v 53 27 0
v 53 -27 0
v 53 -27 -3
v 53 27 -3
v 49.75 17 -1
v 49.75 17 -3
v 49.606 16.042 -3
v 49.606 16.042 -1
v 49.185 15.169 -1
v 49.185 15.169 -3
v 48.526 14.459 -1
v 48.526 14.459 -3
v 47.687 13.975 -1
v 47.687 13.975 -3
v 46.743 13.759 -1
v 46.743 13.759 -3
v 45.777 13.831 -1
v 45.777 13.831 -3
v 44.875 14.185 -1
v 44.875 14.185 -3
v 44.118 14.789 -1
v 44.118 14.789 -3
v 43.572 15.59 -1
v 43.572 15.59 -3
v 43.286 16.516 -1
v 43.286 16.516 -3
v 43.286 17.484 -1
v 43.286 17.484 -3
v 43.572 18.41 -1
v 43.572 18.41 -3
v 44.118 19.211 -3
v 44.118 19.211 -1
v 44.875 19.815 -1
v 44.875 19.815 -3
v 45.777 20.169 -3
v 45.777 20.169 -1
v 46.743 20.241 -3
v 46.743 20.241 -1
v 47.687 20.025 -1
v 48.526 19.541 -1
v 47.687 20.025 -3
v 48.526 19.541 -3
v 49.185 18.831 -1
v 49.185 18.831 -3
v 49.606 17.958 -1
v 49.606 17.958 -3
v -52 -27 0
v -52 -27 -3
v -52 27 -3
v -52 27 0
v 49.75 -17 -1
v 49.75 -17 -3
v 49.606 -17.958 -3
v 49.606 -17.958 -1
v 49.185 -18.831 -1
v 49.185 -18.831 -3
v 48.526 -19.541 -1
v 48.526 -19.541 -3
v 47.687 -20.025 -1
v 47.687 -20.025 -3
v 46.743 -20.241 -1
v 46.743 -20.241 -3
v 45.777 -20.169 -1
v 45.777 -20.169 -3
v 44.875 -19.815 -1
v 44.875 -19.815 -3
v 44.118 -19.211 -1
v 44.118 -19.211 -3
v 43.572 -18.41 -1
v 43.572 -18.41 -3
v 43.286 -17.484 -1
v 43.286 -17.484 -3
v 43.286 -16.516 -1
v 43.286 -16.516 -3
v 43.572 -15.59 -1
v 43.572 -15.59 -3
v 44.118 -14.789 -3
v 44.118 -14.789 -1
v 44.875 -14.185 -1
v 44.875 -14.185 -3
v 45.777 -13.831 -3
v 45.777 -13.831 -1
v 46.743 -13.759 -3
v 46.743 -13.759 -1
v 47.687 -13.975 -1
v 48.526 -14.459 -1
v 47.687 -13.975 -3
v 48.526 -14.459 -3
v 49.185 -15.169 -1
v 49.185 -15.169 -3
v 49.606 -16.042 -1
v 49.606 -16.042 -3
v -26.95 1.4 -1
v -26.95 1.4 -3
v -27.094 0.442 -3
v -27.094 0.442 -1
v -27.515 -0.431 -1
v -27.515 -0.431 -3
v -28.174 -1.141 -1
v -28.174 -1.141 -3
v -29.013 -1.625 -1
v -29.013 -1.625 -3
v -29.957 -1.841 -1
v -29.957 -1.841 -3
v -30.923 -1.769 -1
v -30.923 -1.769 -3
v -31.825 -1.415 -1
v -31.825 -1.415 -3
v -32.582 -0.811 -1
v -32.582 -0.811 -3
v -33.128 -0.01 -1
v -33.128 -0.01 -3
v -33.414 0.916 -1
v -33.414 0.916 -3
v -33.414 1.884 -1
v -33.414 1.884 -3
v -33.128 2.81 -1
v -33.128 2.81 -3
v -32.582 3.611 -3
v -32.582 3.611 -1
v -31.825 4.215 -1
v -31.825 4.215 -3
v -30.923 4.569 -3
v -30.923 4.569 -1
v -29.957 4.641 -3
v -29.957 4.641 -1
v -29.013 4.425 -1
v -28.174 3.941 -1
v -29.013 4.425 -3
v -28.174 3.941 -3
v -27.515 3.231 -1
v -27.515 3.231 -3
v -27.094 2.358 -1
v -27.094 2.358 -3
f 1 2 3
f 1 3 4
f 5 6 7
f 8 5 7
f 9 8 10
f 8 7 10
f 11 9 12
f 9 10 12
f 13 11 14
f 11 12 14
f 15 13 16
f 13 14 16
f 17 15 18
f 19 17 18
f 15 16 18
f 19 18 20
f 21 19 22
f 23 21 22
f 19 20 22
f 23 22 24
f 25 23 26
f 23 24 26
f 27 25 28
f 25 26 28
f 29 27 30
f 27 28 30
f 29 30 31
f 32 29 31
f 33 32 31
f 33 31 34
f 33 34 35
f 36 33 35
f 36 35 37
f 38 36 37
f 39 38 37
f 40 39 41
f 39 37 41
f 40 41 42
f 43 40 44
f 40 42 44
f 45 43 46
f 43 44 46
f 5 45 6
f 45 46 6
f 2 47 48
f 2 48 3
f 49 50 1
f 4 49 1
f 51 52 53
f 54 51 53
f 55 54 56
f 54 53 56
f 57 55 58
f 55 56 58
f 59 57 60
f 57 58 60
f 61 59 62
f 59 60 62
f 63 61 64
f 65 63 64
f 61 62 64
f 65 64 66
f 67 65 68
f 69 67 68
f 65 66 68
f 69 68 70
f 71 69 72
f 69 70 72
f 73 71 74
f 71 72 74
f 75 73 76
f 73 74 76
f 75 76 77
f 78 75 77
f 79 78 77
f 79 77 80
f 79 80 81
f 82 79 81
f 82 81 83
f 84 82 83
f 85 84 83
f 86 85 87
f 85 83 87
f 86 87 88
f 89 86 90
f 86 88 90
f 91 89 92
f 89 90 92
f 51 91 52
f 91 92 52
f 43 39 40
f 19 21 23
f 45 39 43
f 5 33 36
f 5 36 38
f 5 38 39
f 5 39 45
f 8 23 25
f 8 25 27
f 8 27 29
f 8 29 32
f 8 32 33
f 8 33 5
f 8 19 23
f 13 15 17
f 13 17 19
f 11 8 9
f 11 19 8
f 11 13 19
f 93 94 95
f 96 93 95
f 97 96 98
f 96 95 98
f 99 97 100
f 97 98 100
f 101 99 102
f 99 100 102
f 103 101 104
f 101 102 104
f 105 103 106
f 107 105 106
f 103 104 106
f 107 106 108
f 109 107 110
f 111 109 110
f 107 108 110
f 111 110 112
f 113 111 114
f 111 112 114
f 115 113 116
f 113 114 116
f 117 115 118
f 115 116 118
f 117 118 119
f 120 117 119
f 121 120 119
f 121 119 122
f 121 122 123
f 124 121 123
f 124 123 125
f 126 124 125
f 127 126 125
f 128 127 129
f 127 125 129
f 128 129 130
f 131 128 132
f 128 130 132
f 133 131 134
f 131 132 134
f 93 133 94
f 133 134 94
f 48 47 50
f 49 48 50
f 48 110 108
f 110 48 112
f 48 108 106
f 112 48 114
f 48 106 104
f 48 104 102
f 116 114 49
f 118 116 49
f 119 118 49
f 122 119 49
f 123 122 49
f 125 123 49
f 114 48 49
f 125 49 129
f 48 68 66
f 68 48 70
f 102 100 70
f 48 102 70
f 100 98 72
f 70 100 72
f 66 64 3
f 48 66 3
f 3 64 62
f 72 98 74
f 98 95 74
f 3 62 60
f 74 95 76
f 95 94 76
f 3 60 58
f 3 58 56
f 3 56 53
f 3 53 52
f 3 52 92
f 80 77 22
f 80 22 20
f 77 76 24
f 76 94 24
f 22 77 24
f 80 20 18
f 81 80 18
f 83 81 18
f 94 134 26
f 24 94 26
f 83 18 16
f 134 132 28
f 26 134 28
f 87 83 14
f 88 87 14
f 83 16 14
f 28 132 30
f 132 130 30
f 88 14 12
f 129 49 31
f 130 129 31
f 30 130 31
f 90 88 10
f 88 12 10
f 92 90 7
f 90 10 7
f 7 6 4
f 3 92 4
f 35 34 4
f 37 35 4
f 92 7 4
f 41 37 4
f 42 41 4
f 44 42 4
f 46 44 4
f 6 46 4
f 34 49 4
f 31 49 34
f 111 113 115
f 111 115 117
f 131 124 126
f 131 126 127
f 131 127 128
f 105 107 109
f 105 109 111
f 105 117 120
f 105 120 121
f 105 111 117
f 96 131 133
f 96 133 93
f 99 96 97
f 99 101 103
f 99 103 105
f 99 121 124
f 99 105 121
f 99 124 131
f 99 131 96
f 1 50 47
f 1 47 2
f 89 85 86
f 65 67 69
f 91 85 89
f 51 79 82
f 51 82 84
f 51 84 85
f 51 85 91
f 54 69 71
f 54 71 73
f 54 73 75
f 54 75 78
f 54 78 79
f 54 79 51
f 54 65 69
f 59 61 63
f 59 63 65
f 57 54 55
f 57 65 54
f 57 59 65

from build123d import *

# Parameters (mm, degrees)
SKETCH016_W     = 105
SKETCH016_H     = 54
PAD009_DEPTH    = 3
SKETCH028_R     = 3.25
POCKET011_DEPTH = 2
SKETCH029_R     = 3.25
POCKET012_DEPTH = 2
SKETCH030_R     = 3.25
POCKET013_DEPTH = 2


with BuildPart() as part:
    # Sketch016 → Pad009 (new body)
    with BuildSketch(Plane.XY):
        with Locations((0.5, 0)):
            Rectangle(SKETCH016_W, SKETCH016_H)
    extrude(amount=-PAD009_DEPTH)

    # Sketch028 (on Face6 of Pad009) → Pocket011 (cut)
    with BuildSketch(Plane(origin=(0, 0, -3), x_dir=(1, 0, 0), z_dir=(0, 0, -1))):
        with Locations((46.5, 17)):
            Circle(SKETCH028_R)
    extrude(amount=-POCKET011_DEPTH, mode=Mode.SUBTRACT)

    # Sketch029 (on Face5 of Pocket011) → Pocket012 (cut)
    with BuildSketch(Plane(origin=(0, 0, -3), x_dir=(1, 0, 0), z_dir=(0, 0, -1))):
        with Locations((46.5, -17)):
            Circle(SKETCH029_R)
    extrude(amount=-POCKET012_DEPTH, mode=Mode.SUBTRACT)

    # Sketch030 (on Face5 of Pocket012) → Pocket013 (cut)
    with BuildSketch(Plane(origin=(0, 0, -3), x_dir=(1, 0, 0), z_dir=(0, 0, -1))):
        with Locations((-30.2, -1.4)):
            Circle(SKETCH030_R)
    extrude(amount=-POCKET013_DEPTH, mode=Mode.SUBTRACT)


solid = part.part
